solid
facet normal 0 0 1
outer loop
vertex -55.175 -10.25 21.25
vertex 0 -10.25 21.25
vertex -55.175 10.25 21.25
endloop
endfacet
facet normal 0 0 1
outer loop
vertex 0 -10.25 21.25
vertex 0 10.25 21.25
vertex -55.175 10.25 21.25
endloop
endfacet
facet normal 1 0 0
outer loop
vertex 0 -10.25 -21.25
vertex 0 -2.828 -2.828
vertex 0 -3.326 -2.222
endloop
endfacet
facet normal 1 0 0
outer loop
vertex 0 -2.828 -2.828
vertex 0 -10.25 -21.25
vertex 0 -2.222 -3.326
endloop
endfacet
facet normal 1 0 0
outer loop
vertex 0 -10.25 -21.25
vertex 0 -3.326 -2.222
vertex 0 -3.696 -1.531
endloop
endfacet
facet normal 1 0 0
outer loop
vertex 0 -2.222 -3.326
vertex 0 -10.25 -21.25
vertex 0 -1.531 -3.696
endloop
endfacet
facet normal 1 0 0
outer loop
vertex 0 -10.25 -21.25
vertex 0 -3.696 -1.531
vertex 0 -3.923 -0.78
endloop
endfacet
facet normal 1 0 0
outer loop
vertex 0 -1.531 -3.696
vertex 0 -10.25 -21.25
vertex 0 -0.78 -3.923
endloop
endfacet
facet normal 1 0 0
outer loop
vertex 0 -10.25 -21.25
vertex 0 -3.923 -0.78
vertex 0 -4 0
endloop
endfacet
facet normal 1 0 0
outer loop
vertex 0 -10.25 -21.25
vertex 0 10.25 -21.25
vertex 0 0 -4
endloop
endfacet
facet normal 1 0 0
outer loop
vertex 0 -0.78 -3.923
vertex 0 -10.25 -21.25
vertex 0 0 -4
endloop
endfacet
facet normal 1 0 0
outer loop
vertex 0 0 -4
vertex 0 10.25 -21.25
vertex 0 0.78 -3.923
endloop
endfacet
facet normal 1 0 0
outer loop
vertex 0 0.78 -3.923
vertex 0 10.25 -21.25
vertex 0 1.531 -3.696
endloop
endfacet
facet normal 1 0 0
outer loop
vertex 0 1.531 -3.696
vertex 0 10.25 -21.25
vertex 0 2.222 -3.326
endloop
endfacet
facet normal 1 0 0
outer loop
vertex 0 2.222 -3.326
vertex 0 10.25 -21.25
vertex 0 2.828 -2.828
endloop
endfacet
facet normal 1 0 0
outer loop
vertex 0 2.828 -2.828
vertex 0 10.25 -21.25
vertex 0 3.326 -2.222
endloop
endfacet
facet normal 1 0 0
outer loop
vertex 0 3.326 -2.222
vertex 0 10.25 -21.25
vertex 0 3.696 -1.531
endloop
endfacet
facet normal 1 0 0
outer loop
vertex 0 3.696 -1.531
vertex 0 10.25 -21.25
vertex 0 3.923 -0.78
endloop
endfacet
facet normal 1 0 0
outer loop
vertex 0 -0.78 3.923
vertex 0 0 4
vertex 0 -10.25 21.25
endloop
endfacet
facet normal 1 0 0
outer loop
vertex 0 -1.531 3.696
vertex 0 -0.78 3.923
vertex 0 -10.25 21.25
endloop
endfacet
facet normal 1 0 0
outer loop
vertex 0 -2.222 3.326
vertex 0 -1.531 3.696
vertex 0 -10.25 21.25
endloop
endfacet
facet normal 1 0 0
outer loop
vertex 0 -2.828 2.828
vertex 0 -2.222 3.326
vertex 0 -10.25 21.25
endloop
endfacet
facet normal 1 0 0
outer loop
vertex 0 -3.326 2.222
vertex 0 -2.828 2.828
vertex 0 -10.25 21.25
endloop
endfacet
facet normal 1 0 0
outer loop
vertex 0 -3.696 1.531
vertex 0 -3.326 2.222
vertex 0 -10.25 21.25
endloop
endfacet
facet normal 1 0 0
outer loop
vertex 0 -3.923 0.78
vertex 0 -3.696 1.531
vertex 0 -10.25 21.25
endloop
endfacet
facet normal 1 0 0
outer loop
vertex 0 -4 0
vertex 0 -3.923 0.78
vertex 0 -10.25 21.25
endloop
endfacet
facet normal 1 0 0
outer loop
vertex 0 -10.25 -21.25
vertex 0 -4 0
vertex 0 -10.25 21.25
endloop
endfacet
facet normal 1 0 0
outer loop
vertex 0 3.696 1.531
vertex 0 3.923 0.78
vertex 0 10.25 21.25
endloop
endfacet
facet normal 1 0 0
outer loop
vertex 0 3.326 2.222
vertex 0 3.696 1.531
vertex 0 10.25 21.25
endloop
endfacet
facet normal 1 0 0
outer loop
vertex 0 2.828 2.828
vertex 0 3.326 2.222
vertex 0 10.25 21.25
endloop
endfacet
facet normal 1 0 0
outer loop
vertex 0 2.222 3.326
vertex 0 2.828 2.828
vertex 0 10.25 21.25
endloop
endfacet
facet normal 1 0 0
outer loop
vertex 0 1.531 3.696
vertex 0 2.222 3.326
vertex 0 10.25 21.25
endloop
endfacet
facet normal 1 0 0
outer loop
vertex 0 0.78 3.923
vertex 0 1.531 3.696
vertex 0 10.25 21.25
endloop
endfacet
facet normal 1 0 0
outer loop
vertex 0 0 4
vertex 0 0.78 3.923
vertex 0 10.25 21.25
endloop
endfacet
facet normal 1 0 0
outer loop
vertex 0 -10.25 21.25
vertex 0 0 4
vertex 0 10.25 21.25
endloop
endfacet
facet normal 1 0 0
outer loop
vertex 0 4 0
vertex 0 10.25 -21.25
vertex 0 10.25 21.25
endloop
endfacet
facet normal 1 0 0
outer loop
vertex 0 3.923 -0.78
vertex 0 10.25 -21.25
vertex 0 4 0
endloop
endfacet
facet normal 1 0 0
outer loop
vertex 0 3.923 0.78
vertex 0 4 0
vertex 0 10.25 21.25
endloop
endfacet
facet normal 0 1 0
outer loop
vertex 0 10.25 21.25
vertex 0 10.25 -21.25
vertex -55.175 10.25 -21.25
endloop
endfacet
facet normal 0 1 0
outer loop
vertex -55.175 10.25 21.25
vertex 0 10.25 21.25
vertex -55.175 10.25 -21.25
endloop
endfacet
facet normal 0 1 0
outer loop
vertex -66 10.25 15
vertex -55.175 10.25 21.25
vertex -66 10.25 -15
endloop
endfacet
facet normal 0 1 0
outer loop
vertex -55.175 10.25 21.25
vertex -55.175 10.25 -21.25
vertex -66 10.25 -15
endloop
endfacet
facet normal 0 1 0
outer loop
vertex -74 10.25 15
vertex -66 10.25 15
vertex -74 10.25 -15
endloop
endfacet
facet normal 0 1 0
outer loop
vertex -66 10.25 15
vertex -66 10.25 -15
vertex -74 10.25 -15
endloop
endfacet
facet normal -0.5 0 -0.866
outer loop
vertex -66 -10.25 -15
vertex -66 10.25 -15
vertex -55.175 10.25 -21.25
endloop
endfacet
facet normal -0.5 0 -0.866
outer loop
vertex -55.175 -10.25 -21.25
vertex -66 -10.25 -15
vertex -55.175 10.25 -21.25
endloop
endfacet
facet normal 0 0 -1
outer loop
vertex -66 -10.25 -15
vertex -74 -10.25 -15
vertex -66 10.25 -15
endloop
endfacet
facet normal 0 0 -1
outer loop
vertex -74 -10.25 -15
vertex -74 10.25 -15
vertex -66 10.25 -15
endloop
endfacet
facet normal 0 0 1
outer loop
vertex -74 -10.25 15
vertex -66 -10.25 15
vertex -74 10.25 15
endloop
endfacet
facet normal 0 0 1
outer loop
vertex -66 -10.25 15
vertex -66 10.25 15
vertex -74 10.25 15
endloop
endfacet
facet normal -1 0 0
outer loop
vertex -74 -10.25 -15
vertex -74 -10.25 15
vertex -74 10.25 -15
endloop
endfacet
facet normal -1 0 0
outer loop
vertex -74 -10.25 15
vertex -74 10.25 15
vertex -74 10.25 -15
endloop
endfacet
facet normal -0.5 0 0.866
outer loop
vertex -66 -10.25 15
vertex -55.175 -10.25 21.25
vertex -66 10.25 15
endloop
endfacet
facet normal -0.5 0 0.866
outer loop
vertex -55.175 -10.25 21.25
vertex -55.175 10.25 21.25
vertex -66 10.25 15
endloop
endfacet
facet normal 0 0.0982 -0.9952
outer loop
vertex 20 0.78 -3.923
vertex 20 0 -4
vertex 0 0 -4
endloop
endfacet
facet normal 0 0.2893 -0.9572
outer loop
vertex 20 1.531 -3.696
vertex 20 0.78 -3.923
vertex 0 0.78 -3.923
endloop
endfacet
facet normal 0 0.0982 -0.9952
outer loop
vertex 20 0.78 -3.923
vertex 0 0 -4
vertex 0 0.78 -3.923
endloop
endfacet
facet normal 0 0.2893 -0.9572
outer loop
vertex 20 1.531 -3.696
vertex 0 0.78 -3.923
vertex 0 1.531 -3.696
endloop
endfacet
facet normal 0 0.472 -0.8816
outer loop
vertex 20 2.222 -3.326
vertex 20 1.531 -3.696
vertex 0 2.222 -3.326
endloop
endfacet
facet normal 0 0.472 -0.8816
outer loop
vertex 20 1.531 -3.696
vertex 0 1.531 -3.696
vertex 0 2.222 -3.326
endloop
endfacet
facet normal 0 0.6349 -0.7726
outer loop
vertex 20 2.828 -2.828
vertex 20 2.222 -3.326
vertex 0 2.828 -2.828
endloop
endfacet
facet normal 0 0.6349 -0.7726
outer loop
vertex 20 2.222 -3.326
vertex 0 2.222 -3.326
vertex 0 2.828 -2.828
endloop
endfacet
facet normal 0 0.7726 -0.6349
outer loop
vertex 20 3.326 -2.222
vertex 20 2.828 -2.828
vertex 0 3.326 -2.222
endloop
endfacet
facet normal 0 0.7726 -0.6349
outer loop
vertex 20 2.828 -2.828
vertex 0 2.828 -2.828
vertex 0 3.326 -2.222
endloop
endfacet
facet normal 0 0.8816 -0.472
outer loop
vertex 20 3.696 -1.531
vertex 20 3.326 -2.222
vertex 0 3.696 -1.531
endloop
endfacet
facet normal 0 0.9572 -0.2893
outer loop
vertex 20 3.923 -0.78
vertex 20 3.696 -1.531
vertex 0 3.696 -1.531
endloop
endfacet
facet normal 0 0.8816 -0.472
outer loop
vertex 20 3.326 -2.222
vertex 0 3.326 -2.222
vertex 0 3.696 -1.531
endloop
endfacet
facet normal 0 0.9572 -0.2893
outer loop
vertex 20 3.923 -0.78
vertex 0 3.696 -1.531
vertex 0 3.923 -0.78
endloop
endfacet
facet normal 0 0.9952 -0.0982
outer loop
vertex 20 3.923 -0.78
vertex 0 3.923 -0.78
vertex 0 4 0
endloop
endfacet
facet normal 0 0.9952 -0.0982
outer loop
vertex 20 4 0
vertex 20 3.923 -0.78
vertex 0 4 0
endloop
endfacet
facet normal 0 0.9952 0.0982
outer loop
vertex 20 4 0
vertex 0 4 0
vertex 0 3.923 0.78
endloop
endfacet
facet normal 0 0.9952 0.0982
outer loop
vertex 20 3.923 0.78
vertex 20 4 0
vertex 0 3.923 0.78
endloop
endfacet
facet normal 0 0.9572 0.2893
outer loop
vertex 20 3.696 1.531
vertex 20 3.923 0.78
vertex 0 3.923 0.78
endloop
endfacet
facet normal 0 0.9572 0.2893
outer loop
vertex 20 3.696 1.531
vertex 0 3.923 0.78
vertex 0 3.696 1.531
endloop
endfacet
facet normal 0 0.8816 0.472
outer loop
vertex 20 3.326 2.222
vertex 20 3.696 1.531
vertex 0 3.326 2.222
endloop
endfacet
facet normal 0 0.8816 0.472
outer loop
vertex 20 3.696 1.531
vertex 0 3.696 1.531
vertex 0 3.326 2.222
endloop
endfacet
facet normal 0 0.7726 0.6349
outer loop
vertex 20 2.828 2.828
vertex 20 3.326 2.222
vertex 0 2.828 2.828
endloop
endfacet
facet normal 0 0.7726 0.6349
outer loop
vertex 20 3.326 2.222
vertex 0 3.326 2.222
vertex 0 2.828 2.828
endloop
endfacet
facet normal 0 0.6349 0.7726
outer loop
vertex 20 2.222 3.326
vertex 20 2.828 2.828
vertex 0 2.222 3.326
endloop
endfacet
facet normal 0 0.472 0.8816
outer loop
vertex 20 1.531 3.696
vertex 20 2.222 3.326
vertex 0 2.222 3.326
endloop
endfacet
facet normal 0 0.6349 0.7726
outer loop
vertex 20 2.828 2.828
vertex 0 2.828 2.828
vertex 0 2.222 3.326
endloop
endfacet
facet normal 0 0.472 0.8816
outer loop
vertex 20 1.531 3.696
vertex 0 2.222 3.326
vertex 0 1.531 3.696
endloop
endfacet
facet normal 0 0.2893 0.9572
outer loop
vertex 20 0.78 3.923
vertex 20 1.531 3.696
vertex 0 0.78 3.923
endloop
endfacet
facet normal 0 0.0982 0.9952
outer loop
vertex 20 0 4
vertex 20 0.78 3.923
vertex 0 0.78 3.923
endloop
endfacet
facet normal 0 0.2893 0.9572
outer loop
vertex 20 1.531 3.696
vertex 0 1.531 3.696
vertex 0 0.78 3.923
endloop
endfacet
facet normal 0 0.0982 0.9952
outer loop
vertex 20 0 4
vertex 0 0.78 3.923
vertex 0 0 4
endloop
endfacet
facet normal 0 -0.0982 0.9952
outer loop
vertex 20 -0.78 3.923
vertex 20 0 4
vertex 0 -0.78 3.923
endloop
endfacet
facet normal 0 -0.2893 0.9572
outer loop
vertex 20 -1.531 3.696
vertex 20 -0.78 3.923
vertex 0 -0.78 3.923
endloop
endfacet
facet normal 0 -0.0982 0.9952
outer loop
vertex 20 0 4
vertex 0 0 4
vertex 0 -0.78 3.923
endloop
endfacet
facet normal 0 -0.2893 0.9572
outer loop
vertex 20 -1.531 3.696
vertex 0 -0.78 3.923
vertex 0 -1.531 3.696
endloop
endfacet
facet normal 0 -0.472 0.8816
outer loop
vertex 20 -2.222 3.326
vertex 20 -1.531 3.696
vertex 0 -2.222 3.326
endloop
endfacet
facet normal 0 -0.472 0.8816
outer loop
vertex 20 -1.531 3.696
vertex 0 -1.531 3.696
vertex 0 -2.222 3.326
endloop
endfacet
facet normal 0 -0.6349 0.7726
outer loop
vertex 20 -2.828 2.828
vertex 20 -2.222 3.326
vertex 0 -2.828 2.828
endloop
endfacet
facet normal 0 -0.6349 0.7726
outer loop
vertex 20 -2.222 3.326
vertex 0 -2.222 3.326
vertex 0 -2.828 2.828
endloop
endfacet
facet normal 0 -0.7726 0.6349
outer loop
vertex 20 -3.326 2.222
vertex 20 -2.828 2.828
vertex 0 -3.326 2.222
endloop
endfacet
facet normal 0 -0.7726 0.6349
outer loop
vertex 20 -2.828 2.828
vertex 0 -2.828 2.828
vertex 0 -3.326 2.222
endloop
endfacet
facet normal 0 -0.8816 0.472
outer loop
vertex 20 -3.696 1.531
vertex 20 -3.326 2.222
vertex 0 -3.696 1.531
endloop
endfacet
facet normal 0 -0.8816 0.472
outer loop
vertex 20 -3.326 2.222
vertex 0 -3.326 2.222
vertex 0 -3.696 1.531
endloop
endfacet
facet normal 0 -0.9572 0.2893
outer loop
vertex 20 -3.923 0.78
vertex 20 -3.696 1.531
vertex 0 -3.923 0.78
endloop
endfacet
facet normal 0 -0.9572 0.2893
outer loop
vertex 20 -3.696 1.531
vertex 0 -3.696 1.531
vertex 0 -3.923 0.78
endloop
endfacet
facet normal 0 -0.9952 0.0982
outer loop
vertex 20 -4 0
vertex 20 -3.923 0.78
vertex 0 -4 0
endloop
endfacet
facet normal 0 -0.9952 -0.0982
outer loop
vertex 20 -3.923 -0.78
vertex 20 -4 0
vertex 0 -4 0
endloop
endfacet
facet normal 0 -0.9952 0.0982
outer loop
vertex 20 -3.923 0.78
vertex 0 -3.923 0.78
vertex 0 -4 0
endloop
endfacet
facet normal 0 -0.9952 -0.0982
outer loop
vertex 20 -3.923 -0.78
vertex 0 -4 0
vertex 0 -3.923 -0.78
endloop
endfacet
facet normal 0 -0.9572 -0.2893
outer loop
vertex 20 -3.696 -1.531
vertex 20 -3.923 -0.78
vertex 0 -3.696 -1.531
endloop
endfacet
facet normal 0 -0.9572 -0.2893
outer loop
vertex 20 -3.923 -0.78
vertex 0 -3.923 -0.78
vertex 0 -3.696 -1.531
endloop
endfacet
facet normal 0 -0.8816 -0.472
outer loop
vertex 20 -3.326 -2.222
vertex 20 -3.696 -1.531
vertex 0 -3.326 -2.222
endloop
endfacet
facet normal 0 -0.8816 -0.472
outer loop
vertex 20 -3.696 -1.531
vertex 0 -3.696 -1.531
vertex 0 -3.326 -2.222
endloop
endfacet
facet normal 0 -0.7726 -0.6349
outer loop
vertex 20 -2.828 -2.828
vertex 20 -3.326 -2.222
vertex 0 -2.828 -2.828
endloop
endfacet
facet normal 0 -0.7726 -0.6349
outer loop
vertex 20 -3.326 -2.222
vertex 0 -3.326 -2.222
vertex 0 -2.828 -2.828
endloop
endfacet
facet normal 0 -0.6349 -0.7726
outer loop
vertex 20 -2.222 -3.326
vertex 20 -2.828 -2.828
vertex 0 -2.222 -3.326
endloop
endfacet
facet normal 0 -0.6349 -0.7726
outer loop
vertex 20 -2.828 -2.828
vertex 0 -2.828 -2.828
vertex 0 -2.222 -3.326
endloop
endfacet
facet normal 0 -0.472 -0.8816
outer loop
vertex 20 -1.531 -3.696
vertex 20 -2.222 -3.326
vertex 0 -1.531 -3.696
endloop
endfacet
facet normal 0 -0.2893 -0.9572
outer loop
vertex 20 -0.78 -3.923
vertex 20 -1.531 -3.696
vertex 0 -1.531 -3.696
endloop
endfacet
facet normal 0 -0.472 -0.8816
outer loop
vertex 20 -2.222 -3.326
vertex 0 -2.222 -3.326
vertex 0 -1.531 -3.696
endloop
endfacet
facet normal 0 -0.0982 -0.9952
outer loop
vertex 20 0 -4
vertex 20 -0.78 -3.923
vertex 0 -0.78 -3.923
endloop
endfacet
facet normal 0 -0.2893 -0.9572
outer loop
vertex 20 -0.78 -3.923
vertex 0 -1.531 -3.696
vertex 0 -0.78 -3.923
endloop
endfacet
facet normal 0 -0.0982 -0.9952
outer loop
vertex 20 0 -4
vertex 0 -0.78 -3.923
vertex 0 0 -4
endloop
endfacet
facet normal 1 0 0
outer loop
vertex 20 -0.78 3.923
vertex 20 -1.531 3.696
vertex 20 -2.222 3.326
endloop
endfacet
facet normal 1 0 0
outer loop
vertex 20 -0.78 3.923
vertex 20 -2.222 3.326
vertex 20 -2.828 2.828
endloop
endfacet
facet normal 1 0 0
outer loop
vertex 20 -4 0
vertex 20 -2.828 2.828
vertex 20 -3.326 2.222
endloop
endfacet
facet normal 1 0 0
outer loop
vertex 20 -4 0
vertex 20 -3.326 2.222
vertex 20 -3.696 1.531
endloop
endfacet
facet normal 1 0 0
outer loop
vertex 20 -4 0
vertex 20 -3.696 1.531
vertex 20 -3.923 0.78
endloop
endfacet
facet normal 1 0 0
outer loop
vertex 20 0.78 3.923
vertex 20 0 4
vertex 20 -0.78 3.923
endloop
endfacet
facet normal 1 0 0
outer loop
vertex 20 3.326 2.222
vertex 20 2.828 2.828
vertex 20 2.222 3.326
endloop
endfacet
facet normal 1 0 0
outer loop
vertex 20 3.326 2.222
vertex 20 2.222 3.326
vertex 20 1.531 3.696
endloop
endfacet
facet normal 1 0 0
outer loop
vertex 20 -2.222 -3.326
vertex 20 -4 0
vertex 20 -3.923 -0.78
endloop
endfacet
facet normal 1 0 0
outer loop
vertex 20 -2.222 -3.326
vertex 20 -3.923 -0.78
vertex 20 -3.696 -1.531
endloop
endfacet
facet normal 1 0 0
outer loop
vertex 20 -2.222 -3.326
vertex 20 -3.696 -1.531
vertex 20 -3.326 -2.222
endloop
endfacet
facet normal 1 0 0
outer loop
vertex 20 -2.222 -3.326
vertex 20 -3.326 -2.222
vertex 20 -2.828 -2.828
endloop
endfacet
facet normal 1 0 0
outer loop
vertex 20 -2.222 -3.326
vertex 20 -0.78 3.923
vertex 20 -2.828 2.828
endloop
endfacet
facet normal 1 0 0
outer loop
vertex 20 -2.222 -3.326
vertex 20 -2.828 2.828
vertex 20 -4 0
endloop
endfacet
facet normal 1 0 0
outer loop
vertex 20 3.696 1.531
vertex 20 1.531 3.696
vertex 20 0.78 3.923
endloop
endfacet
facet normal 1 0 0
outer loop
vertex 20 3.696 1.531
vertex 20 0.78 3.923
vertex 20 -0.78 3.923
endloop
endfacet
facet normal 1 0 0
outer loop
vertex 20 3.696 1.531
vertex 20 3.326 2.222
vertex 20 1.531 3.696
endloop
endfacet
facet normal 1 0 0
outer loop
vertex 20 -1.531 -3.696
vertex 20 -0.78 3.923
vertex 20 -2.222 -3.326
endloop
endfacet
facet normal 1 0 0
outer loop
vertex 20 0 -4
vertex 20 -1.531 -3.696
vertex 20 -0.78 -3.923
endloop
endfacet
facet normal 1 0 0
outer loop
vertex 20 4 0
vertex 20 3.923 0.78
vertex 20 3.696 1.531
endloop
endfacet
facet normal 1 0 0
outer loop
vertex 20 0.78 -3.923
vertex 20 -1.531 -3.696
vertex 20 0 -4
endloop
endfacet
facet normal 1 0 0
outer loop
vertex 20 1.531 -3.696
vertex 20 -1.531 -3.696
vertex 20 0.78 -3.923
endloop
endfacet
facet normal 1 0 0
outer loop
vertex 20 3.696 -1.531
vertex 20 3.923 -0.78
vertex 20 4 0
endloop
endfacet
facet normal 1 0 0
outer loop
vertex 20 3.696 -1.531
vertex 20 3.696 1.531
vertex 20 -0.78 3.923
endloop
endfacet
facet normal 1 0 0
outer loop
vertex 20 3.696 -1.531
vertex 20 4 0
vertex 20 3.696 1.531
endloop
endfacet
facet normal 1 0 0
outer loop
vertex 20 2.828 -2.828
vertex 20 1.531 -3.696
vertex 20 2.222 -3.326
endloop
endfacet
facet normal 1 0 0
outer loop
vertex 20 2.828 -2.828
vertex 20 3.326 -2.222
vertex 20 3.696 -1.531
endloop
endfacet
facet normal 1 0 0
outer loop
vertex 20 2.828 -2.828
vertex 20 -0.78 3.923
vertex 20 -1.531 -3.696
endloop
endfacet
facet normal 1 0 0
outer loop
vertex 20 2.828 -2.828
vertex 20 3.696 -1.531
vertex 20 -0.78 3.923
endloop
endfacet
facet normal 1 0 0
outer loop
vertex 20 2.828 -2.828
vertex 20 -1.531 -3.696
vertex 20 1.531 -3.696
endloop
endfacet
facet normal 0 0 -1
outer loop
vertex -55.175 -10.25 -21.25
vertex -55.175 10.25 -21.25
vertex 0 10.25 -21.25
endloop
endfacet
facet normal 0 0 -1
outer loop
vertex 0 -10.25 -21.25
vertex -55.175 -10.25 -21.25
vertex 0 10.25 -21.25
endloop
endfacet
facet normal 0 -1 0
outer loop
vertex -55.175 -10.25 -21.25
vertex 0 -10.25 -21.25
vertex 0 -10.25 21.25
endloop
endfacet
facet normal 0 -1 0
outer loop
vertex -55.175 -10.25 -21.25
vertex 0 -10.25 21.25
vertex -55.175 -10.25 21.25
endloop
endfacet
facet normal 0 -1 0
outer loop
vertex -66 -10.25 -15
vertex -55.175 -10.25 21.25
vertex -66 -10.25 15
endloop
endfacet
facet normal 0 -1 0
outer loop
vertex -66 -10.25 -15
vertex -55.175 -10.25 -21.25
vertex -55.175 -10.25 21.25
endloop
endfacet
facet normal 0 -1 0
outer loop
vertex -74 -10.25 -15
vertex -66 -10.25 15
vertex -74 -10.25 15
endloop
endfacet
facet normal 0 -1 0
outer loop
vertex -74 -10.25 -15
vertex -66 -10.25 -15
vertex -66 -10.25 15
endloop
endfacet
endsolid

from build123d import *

# Parameters (mm, degrees)
AUFSATZ_LINEAR_AUSTRAGEN1_DEPTH      = 10.25
AUFSATZ_LINEAR_AUSTRAGEN1_DEPTH_BACK = 10.25
SKIZZE2_R                            = 4
AUFSATZ_LINEAR_AUSTRAGEN2_DEPTH      = 20


with BuildPart() as part:
    # Skizze1 → Aufsatz-Linear austragen1 (new, two sides: drawn at the far end of the back side and taken through both)
    with BuildSketch(Plane(origin=(0, 0, 0), x_dir=(1, 0, 0), z_dir=(0, 1, 0)).offset(-AUFSATZ_LINEAR_AUSTRAGEN1_DEPTH_BACK)):
        Polygon((0, 21.25), (0, -21.25), (-55.174682453, -21.25), (-66, -15), (-74, -15), (-74, 15), (-66, 15), (-55.174682453, 21.25), align=None)
    extrude(amount=AUFSATZ_LINEAR_AUSTRAGEN1_DEPTH + AUFSATZ_LINEAR_AUSTRAGEN1_DEPTH_BACK)

    # Skizze2 → Aufsatz-Linear austragen2 (add)
    with BuildSketch(Plane(origin=(0, 0, 0), x_dir=(0, 0, -1), z_dir=(1, 0, 0))):
        Circle(SKIZZE2_R)
    extrude(amount=AUFSATZ_LINEAR_AUSTRAGEN2_DEPTH)


solid = part.part
